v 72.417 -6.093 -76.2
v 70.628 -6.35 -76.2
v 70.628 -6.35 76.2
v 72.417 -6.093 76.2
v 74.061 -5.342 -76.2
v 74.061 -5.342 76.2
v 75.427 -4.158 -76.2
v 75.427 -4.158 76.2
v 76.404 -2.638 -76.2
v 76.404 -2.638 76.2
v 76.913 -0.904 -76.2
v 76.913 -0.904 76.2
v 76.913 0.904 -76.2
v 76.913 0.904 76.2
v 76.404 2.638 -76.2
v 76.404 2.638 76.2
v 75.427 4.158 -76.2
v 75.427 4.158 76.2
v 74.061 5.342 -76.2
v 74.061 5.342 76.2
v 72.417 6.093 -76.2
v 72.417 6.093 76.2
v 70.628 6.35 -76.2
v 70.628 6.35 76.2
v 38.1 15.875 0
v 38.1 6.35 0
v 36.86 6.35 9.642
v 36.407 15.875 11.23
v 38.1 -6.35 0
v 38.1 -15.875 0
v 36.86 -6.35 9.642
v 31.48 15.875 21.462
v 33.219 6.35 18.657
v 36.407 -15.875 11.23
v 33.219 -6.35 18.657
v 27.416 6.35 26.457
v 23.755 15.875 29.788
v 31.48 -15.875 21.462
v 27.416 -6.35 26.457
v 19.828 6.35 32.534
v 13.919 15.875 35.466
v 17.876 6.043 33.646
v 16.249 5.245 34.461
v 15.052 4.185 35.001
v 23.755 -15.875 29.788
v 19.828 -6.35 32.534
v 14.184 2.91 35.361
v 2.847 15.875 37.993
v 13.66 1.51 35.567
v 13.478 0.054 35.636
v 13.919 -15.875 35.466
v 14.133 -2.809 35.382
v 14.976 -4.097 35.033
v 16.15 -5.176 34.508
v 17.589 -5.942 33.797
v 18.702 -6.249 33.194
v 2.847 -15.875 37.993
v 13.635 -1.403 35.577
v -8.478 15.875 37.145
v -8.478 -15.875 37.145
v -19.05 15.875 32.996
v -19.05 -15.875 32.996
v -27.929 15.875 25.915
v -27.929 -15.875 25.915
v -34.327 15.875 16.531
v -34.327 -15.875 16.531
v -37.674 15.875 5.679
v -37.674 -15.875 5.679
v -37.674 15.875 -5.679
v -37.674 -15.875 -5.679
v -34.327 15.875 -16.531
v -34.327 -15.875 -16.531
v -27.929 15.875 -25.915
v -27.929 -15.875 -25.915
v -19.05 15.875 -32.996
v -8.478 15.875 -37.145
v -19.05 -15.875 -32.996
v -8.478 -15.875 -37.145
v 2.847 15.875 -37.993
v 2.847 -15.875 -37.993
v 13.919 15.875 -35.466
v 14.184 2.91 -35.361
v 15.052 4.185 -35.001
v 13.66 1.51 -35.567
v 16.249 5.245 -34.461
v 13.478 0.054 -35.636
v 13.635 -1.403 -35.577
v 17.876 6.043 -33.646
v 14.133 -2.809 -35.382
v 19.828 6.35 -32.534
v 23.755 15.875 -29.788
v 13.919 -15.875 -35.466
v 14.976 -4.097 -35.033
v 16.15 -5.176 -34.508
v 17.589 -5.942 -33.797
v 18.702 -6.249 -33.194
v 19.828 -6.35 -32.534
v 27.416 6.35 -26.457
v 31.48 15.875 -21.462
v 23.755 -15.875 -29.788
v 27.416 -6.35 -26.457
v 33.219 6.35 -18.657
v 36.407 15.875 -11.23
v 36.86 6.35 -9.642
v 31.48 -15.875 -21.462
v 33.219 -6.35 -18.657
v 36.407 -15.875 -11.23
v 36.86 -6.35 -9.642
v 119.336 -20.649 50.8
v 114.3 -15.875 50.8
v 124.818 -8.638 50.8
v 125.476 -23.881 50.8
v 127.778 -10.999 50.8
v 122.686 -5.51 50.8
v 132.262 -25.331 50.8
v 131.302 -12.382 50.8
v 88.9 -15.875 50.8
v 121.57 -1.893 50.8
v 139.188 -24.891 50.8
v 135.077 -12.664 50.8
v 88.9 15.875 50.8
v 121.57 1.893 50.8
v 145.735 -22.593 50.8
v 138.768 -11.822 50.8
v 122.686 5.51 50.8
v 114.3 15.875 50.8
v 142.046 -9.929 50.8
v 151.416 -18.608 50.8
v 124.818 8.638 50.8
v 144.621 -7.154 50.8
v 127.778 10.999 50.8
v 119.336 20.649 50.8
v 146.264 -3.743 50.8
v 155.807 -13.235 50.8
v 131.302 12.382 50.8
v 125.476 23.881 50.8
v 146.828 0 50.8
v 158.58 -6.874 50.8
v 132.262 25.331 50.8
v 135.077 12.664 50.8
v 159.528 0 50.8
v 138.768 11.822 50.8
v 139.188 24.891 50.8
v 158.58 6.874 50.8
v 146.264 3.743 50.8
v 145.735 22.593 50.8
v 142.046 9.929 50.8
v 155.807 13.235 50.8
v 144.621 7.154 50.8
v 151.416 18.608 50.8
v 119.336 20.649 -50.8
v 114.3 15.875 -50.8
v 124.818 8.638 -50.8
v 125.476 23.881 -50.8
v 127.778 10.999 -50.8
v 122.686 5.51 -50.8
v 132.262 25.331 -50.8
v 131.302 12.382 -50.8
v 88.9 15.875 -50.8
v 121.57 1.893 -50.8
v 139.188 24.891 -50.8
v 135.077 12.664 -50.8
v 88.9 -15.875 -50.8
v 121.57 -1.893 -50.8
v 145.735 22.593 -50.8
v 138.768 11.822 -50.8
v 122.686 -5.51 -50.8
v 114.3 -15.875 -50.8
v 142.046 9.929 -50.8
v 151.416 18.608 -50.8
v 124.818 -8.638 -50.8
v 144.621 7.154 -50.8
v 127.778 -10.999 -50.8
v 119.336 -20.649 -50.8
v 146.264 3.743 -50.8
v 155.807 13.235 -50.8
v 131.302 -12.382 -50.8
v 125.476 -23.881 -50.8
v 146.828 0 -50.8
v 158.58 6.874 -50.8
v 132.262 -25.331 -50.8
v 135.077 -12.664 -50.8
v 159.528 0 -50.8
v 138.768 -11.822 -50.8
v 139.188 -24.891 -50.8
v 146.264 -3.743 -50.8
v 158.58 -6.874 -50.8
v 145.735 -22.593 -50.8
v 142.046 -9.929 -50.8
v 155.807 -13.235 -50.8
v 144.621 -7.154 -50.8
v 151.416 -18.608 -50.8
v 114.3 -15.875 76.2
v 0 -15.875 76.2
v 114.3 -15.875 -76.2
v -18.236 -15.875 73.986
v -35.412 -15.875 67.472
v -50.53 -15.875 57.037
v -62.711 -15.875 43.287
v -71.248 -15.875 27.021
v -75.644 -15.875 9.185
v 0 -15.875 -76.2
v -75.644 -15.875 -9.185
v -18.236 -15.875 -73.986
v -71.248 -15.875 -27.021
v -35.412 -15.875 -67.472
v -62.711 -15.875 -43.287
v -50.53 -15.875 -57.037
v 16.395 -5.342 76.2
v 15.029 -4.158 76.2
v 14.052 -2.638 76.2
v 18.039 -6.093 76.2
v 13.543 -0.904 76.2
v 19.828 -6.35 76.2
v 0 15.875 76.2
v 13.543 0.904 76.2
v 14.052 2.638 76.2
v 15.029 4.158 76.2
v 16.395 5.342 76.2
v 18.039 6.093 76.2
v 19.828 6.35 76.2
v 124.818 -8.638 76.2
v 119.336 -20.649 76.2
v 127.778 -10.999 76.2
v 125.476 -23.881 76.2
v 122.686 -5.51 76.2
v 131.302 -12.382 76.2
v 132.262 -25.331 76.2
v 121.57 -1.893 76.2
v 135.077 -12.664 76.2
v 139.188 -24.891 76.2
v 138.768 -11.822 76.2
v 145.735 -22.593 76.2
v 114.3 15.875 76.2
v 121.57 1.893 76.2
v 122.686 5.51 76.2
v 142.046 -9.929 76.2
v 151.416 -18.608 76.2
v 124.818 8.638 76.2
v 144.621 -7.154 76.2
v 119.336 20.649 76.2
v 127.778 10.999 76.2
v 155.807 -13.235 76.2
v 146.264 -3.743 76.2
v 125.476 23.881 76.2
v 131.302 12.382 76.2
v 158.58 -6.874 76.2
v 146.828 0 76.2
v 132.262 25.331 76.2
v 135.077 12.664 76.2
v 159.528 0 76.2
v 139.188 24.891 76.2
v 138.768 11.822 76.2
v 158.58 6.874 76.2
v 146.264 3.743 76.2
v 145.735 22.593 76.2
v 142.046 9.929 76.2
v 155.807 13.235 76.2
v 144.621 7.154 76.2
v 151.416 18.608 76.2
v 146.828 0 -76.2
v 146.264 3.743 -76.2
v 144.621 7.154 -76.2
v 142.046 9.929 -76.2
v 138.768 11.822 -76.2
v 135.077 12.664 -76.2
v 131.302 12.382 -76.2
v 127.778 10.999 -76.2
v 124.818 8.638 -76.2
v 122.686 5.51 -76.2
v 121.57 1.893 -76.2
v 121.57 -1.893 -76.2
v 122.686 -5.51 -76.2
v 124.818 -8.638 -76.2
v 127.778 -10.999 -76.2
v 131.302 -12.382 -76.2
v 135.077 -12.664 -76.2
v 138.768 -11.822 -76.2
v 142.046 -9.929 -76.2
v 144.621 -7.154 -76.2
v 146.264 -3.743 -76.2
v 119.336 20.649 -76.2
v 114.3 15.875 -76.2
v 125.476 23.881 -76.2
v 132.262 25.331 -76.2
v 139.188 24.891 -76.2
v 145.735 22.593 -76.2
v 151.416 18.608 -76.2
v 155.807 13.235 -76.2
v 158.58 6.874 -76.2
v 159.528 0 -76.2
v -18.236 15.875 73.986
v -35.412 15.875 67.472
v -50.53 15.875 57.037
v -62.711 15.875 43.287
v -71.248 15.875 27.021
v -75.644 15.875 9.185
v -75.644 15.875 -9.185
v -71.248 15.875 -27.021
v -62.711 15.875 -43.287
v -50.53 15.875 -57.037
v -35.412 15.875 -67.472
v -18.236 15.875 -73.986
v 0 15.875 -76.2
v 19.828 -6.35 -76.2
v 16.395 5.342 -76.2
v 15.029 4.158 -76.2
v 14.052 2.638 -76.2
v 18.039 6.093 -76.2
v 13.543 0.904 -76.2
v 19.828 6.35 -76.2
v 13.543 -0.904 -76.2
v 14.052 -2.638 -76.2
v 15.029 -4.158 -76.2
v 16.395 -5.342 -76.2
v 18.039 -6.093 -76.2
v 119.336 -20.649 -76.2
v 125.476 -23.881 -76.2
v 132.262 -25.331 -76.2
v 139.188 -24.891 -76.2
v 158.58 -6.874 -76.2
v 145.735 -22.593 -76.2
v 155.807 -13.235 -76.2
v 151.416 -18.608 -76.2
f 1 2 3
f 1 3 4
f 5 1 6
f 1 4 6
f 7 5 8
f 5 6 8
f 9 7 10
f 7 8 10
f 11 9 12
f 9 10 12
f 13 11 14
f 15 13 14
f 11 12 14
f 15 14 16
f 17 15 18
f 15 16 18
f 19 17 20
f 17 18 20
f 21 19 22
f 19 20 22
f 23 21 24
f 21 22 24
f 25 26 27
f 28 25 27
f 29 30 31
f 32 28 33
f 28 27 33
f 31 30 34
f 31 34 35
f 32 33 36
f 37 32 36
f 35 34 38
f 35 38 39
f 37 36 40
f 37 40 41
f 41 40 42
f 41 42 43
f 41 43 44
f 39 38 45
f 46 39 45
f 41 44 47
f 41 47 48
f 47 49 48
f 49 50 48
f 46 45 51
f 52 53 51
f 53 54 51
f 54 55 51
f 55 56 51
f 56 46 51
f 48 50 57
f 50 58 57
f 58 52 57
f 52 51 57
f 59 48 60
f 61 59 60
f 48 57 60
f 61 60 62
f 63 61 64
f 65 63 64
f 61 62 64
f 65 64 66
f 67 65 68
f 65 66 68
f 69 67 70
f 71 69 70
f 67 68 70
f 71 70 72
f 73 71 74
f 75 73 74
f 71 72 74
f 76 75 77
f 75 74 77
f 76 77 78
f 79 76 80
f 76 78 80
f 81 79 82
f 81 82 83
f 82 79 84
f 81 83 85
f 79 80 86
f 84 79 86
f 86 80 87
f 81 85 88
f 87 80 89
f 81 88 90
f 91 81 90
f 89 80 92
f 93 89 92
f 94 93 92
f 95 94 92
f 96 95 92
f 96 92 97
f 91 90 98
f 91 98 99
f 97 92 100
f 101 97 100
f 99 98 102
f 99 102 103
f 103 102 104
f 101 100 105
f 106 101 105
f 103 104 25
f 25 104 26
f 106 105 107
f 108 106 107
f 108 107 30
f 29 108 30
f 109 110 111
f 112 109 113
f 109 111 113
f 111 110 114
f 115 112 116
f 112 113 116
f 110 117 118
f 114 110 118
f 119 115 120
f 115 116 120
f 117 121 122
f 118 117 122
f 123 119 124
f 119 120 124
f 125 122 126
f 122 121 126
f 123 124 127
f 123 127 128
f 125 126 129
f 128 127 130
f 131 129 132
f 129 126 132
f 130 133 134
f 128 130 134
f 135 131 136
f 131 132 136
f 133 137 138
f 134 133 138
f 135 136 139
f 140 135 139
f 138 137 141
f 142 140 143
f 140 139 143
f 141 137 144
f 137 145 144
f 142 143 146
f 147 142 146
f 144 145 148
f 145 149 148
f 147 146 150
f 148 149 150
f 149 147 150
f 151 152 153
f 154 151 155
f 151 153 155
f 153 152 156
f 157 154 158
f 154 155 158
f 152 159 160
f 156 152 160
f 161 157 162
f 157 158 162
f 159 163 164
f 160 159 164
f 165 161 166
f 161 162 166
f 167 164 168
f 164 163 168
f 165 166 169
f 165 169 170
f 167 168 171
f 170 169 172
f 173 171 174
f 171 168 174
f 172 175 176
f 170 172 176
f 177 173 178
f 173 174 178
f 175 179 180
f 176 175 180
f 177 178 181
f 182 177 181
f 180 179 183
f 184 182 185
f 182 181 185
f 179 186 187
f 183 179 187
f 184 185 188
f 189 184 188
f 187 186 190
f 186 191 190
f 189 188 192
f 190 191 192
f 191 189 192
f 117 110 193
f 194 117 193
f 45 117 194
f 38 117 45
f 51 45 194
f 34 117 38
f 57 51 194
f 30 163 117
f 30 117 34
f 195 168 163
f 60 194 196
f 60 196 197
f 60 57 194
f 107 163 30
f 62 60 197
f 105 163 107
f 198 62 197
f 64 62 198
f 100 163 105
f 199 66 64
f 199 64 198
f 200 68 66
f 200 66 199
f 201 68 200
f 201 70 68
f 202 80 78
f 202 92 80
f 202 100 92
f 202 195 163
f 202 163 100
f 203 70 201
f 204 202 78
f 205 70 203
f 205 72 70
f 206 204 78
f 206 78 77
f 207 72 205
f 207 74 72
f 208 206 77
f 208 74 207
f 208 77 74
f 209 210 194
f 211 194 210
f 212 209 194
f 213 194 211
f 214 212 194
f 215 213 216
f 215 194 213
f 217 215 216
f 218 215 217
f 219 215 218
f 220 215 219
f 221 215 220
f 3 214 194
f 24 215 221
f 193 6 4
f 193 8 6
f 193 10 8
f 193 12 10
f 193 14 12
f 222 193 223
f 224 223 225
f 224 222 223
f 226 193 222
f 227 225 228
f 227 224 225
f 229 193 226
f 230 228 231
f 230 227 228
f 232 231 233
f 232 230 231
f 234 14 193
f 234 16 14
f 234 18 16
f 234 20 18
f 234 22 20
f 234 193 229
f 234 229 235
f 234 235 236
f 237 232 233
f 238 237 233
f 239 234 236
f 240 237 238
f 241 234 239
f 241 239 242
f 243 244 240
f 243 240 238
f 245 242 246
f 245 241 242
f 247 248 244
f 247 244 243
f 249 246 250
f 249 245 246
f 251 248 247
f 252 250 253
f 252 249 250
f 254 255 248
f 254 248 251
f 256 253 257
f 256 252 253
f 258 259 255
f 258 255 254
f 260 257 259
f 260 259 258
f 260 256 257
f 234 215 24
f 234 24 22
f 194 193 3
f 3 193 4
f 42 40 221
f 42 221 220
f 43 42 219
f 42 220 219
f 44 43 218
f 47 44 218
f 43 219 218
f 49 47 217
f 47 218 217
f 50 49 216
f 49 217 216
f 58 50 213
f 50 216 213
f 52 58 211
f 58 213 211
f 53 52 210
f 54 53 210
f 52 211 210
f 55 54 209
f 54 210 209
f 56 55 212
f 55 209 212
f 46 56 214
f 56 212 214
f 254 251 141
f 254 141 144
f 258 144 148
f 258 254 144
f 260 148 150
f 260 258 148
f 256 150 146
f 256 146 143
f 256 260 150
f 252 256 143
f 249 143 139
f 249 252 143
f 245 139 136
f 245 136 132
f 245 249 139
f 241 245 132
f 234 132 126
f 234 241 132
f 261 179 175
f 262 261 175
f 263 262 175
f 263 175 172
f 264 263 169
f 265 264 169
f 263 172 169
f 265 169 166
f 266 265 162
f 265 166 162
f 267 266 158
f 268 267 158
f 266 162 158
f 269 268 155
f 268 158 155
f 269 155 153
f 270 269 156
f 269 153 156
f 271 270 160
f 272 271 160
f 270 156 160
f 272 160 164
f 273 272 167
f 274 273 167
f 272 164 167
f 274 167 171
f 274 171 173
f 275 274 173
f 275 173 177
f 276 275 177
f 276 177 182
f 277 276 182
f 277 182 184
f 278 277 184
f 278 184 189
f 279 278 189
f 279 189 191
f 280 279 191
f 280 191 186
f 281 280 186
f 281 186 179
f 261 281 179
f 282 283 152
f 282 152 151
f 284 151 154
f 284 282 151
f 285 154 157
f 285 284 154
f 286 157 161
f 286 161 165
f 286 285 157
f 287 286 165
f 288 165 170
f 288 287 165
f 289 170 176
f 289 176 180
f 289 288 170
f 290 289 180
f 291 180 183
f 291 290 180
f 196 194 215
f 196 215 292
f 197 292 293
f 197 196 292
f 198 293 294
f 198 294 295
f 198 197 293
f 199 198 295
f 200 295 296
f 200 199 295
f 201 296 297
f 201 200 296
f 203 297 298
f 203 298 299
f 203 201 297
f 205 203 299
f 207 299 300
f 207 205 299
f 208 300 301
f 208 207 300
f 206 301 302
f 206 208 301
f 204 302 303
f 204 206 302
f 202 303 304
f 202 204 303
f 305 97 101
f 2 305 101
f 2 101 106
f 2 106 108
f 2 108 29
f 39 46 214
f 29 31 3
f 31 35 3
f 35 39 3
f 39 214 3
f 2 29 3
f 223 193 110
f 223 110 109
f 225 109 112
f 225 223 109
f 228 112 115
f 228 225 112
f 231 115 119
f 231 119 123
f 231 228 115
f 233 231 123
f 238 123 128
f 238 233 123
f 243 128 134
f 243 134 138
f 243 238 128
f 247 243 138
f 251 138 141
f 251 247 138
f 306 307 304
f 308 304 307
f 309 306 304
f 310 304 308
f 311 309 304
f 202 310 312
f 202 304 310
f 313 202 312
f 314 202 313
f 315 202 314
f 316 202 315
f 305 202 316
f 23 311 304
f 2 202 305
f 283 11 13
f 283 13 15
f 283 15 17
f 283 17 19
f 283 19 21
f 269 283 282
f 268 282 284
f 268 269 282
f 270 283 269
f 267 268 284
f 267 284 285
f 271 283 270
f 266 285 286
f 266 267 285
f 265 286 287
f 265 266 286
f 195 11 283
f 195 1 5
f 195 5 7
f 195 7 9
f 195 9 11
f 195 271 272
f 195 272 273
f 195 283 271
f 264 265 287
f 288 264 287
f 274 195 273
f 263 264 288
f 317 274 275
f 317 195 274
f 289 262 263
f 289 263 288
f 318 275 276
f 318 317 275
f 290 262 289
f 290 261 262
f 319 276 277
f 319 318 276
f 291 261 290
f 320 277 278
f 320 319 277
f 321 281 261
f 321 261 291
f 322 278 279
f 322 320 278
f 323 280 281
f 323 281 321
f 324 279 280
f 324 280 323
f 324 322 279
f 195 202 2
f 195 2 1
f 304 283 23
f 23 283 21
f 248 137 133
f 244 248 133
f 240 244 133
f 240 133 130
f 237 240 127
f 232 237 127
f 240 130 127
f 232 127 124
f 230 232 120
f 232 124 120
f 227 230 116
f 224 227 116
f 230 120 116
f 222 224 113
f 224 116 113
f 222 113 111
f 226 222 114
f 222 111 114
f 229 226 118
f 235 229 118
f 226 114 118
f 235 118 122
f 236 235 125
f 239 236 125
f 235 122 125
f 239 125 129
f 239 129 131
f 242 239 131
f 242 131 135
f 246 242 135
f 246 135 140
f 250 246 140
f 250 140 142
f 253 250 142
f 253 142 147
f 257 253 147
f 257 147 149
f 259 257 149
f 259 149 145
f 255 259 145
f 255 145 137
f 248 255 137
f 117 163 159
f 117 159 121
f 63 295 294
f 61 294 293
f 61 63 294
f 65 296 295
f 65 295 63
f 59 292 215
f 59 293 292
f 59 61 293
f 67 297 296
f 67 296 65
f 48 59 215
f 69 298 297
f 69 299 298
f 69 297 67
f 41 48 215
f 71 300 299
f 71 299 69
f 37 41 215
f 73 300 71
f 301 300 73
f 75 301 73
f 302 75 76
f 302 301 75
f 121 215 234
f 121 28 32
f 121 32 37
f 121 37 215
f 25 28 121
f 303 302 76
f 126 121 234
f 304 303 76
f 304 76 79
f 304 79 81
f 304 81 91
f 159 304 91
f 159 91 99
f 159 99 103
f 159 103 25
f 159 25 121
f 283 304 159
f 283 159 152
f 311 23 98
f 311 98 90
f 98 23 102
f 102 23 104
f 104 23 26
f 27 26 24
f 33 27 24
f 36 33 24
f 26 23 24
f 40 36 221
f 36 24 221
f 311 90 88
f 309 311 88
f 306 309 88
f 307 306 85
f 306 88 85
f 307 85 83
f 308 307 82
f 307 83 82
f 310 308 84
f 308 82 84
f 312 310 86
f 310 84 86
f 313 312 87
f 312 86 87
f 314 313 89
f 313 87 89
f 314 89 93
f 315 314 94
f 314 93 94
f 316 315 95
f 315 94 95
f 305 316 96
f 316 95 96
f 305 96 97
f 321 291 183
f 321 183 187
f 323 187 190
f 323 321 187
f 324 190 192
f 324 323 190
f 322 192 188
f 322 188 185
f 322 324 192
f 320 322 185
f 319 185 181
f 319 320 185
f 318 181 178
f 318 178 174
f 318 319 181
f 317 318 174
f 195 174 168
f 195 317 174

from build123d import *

# Parameters (mm, degrees)
F1_DEPTH  = 15.875
F2_R      = 38.1
F3_DEPTH  = 31.751
F5_DEPTH  = 25.4
F6_R      = 12.7
F7_DEPTH  = 152.401
F9_DEPTH  = 25.4
F10_R     = 12.7
F11_DEPTH = 152.401
F14_DEPTH = 152.401


with BuildPart() as f1:
    # F0 (on Front) → F1 (new body, symmetric)
    with BuildSketch(Plane.XZ):
        with BuildLine():
            Line((88.9, 76.2), (0, 76.2))
            ThreePointArc((0, 76.2), (-76.2, 0), (0, -76.2))
            Line((0, -76.2), (88.9, -76.2))
            Line((88.9, -76.2), (88.9, 76.2))
        make_face()
    extrude(amount=F1_DEPTH, both=True)

    # F2 (on face) → F3 (cut, through all)
    with BuildSketch(Plane.XZ.offset(15.875)):
        Circle(F2_R)
    extrude(amount=-F3_DEPTH, mode=Mode.SUBTRACT)

    # F4 (on face) → F5 (join)
    with BuildSketch(Plane.XY.offset(76.2)):
        with BuildLine():
            ThreePointArc((114.3, -15.875), (142.540126, -23.966517), (159.527869, 0))
            ThreePointArc((159.527869, 0), (142.540126, 23.966517), (114.3, 15.875))
            ThreePointArc((114.3, 15.875), (108.727869, 0), (114.3, -15.875))
        make_face()
        with BuildLine():
            Line((114.3, 15.875), (88.9, 15.875))
            Line((88.9, 15.875), (88.9, -15.875))
            Line((88.9, -15.875), (114.3, -15.875))
            ThreePointArc((114.3, -15.875), (108.727869, 0), (114.3, 15.875))
        make_face()
    extrude(amount=-F5_DEPTH)

    # F6 (on face) → F7 (cut, through all)
    with BuildSketch(Plane(origin=(0, 0, -76.2), x_dir=(1, 0, 0), z_dir=(0, 0, -1))):
        with Locations((134.127869, 0)):
            Circle(F6_R)
    extrude(amount=-F7_DEPTH, mode=Mode.SUBTRACT)

    # F8 (on face) → F9 (join)
    with BuildSketch(Plane(origin=(0, 0, -76.2), x_dir=(1, 0, 0), z_dir=(0, 0, -1))):
        with BuildLine():
            Line((114.3, 15.875), (88.9, 15.875))
            Line((88.9, 15.875), (88.9, -15.875))
            Line((88.9, -15.875), (114.3, -15.875))
            ThreePointArc((114.3, -15.875), (108.727869, 0), (114.3, 15.875))
        make_face()
        with BuildLine():
            ThreePointArc((159.527869, 0), (142.540126, 23.966517), (114.3, 15.875))
            ThreePointArc((114.3, 15.875), (108.727869, 0), (114.3, -15.875))
            ThreePointArc((114.3, -15.875), (142.540126, -23.966517), (159.527869, 0))
        make_face()
    extrude(amount=-F9_DEPTH)

    # F10 (on face) → F11 (cut, through all)
    with BuildSketch(Plane.XY.offset(76.2)):
        with Locations((134.127869, 0)):
            Circle(F10_R)
    extrude(amount=-F11_DEPTH, mode=Mode.SUBTRACT)

    # F13 (on face) → F14 (cut, through all)
    with BuildSketch(Plane.XY.offset(76.2)):
        with BuildLine():
            Line((70.627869, 6.35), (19.827869, 6.35))
            ThreePointArc((19.827869, 6.35), (13.477869, 0), (19.827869, -6.35))
            Line((19.827869, -6.35), (70.627869, -6.35))
            ThreePointArc((70.627869, -6.35), (76.977869, 0), (70.627869, 6.35))
        make_face()
    extrude(amount=-F14_DEPTH, mode=Mode.SUBTRACT)


solid = f1.part
